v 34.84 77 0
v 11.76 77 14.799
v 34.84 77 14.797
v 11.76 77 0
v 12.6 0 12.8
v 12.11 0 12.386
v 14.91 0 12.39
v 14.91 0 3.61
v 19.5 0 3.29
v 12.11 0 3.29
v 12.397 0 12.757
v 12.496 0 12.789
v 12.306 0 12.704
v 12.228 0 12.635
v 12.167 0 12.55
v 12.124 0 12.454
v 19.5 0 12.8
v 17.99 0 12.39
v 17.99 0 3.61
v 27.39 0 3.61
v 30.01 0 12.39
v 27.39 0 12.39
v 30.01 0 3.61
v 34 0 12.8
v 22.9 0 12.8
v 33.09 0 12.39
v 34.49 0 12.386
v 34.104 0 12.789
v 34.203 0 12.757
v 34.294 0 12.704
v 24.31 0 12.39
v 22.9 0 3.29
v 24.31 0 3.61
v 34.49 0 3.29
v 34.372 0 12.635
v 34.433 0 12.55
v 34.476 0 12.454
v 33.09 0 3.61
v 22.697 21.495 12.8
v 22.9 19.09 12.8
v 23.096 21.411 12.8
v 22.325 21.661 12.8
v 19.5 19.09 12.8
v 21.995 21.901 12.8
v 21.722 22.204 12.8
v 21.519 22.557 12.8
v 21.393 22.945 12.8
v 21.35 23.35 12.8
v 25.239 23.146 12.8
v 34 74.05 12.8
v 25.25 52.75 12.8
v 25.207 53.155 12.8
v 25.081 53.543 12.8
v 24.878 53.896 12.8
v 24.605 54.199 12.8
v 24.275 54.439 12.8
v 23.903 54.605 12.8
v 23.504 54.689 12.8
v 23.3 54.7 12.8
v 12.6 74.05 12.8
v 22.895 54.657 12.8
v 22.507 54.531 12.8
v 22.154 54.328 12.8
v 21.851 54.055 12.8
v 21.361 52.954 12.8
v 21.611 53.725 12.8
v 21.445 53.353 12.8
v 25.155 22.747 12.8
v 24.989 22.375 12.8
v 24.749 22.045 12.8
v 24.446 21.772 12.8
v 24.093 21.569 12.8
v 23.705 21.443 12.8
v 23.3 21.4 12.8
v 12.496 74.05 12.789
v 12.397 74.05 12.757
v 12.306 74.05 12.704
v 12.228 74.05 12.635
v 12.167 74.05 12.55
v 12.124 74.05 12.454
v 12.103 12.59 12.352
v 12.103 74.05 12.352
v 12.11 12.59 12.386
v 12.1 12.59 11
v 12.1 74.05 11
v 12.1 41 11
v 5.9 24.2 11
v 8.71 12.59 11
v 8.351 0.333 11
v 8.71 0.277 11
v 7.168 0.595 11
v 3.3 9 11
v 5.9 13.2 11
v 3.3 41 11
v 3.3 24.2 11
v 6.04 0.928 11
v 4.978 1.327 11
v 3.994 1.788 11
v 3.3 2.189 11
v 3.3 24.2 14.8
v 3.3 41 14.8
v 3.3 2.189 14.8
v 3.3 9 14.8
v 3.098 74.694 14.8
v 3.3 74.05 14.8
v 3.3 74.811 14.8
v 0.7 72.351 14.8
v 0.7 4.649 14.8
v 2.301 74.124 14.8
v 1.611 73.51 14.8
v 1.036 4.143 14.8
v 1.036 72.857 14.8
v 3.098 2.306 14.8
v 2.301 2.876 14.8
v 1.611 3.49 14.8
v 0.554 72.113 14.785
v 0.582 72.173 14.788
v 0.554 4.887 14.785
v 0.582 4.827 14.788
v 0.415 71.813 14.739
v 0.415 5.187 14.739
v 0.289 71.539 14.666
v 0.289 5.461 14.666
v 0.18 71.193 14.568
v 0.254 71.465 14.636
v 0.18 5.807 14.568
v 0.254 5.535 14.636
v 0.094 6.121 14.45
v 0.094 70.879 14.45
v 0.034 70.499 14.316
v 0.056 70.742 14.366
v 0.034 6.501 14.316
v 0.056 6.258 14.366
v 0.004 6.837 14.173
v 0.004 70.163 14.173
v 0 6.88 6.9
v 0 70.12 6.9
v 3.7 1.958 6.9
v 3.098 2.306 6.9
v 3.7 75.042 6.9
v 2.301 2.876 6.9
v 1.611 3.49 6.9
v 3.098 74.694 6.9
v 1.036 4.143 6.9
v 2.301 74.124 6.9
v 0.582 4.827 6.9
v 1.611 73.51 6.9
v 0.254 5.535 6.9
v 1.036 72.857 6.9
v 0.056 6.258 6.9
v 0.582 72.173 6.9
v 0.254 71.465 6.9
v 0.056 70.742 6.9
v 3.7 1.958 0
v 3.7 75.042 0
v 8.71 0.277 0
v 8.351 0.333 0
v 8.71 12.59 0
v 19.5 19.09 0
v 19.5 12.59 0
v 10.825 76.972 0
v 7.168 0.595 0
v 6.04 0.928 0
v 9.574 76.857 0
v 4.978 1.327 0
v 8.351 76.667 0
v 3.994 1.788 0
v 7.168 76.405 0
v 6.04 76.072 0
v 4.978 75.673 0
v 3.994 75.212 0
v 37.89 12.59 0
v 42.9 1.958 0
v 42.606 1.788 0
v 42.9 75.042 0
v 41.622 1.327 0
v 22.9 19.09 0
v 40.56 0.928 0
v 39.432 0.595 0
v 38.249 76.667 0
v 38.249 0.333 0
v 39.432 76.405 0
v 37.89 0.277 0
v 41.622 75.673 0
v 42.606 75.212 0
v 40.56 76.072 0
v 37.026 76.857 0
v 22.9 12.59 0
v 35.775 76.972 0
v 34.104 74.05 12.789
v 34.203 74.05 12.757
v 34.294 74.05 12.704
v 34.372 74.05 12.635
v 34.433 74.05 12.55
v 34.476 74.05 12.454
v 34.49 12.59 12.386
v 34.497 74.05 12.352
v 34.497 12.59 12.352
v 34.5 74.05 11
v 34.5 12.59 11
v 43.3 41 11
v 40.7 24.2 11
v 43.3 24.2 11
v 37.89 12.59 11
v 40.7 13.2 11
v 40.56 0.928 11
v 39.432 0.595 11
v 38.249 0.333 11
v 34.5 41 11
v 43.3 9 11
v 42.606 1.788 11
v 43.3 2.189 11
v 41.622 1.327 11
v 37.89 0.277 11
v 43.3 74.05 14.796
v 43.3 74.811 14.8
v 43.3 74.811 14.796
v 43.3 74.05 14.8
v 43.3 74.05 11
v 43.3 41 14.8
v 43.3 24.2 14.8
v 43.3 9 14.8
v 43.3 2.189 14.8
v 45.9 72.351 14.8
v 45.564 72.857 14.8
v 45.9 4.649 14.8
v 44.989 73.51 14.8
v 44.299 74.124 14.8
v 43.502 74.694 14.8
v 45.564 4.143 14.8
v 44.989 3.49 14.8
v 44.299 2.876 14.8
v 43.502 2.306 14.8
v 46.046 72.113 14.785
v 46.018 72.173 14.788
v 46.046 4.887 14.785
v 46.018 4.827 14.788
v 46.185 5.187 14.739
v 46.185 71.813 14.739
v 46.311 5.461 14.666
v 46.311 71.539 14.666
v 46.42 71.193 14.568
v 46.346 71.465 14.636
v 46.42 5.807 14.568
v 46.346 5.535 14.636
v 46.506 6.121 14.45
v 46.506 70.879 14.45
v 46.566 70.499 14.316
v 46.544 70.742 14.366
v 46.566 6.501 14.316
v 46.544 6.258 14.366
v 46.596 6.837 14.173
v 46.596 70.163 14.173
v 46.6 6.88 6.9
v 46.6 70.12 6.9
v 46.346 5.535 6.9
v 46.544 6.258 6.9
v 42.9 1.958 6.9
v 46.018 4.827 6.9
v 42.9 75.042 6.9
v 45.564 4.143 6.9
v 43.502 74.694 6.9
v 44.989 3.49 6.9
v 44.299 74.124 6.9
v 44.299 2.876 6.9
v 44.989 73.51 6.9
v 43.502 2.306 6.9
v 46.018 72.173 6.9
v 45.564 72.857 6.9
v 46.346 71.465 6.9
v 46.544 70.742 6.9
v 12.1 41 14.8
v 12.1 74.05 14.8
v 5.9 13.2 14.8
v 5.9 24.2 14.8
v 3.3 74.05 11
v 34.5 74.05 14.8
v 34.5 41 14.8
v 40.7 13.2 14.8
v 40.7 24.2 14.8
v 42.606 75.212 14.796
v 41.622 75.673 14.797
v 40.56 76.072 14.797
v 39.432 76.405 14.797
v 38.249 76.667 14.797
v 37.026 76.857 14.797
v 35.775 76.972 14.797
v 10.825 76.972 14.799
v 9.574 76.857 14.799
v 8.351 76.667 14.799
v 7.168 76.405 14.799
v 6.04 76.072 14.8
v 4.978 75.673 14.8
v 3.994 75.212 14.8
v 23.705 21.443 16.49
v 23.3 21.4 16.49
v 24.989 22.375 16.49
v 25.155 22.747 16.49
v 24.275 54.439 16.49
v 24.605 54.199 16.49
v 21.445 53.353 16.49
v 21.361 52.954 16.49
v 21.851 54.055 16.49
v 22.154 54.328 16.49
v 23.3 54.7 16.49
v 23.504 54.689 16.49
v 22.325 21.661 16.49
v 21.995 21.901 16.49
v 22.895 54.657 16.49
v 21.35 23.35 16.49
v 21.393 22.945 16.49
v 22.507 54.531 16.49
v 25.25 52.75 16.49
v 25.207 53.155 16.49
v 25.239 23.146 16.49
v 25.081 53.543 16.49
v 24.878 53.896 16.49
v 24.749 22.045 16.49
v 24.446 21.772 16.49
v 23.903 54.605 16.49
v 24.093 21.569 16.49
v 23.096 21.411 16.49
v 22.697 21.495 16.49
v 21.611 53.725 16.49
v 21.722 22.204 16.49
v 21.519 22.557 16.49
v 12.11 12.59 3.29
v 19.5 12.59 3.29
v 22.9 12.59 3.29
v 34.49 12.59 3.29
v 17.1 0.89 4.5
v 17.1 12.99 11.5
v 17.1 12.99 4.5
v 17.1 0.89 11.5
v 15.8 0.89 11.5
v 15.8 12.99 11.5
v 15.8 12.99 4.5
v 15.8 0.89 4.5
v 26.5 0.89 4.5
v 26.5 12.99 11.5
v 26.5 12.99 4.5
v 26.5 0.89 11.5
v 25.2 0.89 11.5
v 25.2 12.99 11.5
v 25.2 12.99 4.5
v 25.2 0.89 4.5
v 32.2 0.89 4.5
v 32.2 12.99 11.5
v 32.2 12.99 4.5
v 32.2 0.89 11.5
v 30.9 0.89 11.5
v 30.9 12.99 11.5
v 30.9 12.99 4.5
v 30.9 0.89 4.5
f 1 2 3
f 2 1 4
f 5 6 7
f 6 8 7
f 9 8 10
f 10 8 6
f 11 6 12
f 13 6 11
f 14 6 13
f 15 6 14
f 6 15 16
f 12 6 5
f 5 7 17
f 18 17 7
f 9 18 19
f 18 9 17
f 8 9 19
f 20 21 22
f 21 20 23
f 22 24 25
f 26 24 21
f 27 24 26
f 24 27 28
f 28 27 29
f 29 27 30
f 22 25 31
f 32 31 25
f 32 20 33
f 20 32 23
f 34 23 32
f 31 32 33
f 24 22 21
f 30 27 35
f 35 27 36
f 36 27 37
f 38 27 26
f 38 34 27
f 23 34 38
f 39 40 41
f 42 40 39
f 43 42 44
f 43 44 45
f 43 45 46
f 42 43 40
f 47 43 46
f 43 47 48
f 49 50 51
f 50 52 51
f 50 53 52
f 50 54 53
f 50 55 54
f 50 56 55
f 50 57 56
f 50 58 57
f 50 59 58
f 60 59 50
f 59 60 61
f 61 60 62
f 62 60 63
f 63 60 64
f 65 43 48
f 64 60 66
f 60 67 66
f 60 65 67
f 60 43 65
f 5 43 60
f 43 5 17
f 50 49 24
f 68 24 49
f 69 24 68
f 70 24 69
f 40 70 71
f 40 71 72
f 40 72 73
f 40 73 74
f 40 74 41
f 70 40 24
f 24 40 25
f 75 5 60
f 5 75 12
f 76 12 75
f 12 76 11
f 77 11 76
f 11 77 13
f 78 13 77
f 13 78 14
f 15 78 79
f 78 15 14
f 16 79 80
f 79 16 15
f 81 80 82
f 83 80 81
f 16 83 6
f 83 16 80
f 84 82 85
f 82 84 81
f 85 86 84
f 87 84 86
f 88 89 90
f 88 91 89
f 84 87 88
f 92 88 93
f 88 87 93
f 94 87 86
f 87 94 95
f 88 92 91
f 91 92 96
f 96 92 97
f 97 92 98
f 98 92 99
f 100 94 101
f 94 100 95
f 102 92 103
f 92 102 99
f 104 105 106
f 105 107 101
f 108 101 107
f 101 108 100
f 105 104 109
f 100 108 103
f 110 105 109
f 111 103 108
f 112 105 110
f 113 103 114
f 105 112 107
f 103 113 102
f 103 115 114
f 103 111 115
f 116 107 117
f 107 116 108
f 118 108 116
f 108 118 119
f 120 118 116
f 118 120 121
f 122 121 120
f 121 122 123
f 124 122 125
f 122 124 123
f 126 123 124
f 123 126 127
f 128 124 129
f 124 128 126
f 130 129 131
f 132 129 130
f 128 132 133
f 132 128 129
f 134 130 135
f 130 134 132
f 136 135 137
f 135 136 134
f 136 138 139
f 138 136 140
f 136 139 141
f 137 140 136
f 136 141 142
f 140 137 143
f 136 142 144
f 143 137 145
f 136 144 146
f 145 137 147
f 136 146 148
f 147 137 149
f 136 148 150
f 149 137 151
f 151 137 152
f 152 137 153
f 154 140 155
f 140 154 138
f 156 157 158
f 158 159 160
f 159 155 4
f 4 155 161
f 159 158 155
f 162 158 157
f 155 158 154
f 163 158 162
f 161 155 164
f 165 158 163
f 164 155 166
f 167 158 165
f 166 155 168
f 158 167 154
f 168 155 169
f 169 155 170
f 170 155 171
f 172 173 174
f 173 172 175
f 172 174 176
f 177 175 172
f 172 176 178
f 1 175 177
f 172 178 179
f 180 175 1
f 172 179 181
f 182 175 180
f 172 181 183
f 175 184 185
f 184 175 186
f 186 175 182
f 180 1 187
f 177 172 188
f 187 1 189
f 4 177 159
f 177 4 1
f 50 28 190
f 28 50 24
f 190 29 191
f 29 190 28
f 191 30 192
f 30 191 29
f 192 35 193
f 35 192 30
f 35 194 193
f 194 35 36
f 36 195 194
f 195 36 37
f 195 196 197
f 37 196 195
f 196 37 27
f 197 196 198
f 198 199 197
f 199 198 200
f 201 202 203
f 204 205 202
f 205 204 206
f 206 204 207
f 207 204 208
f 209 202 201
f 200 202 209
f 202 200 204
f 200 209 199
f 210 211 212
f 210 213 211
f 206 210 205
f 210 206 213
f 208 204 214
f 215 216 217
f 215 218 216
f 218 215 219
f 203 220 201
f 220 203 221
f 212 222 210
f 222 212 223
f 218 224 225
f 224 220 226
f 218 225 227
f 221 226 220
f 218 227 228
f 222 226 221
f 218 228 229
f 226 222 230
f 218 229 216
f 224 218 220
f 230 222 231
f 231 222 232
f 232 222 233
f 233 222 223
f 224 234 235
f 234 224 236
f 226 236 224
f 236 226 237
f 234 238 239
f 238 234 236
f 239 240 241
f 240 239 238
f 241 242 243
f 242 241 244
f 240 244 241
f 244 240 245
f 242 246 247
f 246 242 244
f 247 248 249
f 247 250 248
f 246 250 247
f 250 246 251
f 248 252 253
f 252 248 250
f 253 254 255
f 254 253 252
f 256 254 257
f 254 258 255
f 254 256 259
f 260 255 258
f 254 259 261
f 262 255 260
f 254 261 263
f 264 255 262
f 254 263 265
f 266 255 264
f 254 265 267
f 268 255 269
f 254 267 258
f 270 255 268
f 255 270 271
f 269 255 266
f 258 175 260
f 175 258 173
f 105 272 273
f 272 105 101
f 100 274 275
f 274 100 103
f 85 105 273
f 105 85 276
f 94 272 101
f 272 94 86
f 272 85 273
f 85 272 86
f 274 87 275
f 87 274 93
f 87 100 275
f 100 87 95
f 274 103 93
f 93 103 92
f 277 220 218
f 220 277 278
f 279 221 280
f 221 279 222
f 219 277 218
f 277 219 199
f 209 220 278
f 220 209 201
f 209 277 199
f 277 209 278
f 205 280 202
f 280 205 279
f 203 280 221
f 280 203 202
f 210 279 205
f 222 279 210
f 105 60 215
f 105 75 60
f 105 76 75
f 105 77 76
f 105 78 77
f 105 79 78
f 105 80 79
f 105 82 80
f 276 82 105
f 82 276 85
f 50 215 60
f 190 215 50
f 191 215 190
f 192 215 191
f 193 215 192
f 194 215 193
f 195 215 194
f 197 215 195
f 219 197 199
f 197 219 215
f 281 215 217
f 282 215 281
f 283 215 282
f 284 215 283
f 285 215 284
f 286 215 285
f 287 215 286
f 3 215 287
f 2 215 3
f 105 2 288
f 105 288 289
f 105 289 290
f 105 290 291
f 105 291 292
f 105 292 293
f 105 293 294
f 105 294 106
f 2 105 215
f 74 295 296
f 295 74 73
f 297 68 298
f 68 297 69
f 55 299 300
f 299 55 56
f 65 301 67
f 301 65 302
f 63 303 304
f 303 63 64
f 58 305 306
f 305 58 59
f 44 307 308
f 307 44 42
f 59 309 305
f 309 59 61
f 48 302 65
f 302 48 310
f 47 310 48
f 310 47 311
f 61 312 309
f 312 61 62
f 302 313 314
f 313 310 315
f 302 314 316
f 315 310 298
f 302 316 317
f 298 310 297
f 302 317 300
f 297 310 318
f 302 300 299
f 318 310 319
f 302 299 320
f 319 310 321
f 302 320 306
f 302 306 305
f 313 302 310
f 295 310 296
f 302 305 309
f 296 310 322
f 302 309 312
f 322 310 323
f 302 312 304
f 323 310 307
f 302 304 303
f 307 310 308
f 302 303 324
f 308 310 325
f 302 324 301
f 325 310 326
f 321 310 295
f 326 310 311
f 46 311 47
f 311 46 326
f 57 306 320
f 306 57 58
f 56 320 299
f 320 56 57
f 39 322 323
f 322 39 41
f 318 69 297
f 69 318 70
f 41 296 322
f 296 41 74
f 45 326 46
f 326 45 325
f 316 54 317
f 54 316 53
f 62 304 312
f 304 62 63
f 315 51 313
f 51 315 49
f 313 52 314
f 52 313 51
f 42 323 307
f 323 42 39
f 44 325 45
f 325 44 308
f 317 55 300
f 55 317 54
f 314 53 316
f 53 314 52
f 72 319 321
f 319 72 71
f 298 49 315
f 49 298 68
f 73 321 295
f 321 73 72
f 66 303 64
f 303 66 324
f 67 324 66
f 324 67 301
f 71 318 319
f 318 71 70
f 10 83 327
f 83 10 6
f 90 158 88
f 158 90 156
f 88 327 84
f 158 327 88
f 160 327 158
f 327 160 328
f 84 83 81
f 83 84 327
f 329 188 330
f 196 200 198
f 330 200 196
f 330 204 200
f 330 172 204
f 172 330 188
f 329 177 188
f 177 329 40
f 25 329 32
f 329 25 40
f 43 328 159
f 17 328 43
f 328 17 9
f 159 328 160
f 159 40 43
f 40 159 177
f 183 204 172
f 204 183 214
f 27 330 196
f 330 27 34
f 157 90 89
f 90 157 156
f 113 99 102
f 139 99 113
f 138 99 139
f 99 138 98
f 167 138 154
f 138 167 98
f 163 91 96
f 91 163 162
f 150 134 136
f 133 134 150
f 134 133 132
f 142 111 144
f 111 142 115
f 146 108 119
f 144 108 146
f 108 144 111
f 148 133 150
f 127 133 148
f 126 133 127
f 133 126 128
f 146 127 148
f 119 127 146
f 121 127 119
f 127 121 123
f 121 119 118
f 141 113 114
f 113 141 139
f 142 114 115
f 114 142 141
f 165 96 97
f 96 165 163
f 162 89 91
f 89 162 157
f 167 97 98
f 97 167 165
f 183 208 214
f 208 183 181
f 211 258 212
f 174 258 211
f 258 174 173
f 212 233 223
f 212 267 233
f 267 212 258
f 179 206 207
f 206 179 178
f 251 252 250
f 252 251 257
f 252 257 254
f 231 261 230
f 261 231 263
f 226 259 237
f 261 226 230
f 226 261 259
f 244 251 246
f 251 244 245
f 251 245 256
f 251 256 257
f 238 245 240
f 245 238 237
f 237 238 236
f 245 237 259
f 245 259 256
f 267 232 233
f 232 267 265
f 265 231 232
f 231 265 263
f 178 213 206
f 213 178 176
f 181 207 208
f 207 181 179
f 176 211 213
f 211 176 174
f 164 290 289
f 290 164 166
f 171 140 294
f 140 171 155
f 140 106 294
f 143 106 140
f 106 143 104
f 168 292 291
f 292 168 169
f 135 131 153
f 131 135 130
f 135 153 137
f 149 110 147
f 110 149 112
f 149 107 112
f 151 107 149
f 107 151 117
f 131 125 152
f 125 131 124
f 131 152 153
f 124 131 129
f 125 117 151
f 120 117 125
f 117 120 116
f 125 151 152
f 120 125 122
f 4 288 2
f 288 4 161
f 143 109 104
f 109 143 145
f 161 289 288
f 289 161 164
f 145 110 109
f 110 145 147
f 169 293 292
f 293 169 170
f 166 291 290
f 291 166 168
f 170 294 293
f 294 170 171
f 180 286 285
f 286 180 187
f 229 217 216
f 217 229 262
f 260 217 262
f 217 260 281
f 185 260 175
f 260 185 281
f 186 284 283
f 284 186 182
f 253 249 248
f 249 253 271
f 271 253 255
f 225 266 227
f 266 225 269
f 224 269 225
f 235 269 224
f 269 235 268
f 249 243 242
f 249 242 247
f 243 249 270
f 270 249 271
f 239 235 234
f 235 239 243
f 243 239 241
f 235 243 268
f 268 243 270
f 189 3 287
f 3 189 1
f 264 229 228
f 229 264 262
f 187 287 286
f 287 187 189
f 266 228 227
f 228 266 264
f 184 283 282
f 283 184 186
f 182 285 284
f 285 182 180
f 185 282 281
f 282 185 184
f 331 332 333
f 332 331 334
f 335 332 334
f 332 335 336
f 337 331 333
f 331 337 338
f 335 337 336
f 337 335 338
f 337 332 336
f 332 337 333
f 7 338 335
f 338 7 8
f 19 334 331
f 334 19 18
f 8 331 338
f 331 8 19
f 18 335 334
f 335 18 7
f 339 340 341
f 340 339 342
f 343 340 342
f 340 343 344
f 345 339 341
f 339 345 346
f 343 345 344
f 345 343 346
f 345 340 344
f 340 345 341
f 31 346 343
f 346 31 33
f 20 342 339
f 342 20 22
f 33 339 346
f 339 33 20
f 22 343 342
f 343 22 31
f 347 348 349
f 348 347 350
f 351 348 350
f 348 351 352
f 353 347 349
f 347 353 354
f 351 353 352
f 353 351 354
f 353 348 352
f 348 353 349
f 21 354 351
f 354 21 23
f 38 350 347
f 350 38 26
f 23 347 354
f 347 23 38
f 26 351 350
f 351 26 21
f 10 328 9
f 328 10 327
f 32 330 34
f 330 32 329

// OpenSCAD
/** @todo Add a customizer parameter to generate the battery socket without the block for the terminals. Allows to 
  *   create blind sockets, such as to secure battery packs for transportation, or to mount them in storage.
  * @todo Add a customizer parameter to choose between creating a solid plastic piece (for a blind plate or similar) 
  *   and one with hollows for terminal clips and wires.
  */

// Up here to appear before any assert() and echo() in the parameters section.
// Narrow enough to fit into one line of output when the console is at minimum width.
echo("\n\n============ NEXT RUN ============");


// (1) INCLUDES
// ======================================================================

// Round Anything library from https://github.com/Irev-Dev/Round-Anything/
include<Round-Anything/polyround.scad>


// (2) CUSTOMIZER PARAMETERS
// ======================================================================

// Degree of details in the output. Influences segments per degree, filleting quality etc..
quality = "preview"; // ["fast preview", "preview", "rendering", "final rendering"]


// (3) FIXED AND DERIVED MEASURES
// ======================================================================

// Prevent anything following from showing up as Customizer parameters.
/* [Hidden] */

// Degrees per fragment of a circle.
$fa = (quality == "final rendering") ? 1 :
      (quality == "rendering") ? 3 : 
      (quality == "preview") ? 6 :
      (quality == "fast preview") ? 12 : 12; // The OpenSCAD default.
      
// Minimum size of circle fragments.
$fs= (quality == "final rendering") ? 0.1 :
     (quality == "rendering") ? 0.25 : 
     (quality == "preview") ? 0.5 :
     (quality == "fast preview") ? 2 : 2; // The OpenSCAD default.

// Small amount of overlap for unions and differences, to prevent z-fighting.
nothing = 0.01;

/** @brief Provide any measure (that we know of) about this design. This acts as a 
  *   central registry for measures to not clutter the global namespace. "m" for "measure".
  *   Most numbers can be adjusted, allowing customization beyond the rather simple parameters in 
  *   the OpenSCAD Customizer. All measures have been taken by measuring an original Milwaukee 
  *   battery connector on a powertool. Different from the original, we only model a connector 
  *   for inserting a battery from one side.
  * @param id  String identifier of the dimension to retrieve. Look into the source to see 
  *   which are available.
  * @todo Add the positions and dimensions of the battery terminal connectors.
  */
function m(id) = (
    // Measures on the battery.
    id == "battery play d" ? 2.7 : // When the battery is in the socket.
    id == "battery snapper wide part total d" ? 6.5 :
    id == "battery snapper d" ? 14.1 :

    // Main measures on the battery socket.
    id == "w" ? 46.6 :
    id == "d" ? 77 :
    id == "side h" ? 14.8 :
    id == "corner radius w" ? m("middle section offset w"): // @todo rename to "h edges radius w"
    id == "corner radius d" ? 7.0 : // @todo rename to "h edges radius d"
    id == "outer edges r" ? 0.7 :   // @todo rename to "d edges radius"
    id == "backwall d min" ? 2.0 :
    id == "backwall d max" ? 3.9 :
    id == "backwall d" ? (m("backwall d min") + m("backwall d max")) / 2 :
    
    // Middle section, which is a separate part of the original Milwaukee battery socket.
    id == "middle section h" ? 12.8 :
    id == "middle section w" ? m("w") - 2 * m("lock grooves offset w") - 2 * m("lock grooves w") :
    id == "middle section offset w" ? (m("w") - m("middle section w")) / 2 :
    id == "middle section undercut h" ? 3.3 :
    id == "middle section undercut d" ? 12.6 :
    id == "middle section edge r" ? 0.5 :
    
    // Raised block on top of the middle section part, forming the highest point of the battery socket.
    id == "ridge w" ? 3.9 :
    id == "ridge d" ? 33.3 :
    id == "ridge h" ? 3.7 :
    id == "ridge offset w" ? m("w") / 2 - m("ridge w") / 2 :
    id == "ridge offset d" ? 21.4 :
    id == "ridge arcs d" ? 1.6 : // Unused. We simplify to a semi-circle arc via a radius the height edges, see below.
    id == "ridge h edges r" ? m("ridge w") / 2 : // Maximum possible corner radius, yielding a semi-circle at the ends.
    
    // Grooves on the left and right to mount the battery pack mechanically. Closer to the device than all other grooves.
    id == "mount grooves w" ? 3.7 :
    id == "mount grooves h" ? 6.9 :
    id == "mount grooves wall t" ? m("terminal grooves 1+3 offset w") - m("mount grooves w") :
    
    // The two grooves with the locking mechanism.
    id == "lock grooves w" ? 8.8 : // Full width, including lock block w.
    id == "lock grooves h" ? 3.8 :
    id == "lock grooves min d" ? 
        m("lock block offset d") + m("lock block d") + m("battery play d") + m("battery snapper d") :
    id == "lock grooves offset w" ? 3.3 :
    id == "lock grooves offset h" ? m("side h") - m("lock grooves h") :
    
    // Snap mechanism inside the snapper grooves.
    id == "lock block w" ? 2.6 :
    id == "lock block d" ? 15.2 :
    id == "lock block ramp d" ? 4.2 : // As part of "lock block d".
    id == "lock block offset d" ? 9.0 :
    
    // The three grooves before, in between and after the terminal block. 1-3 from left to right.
    id == "terminal grooves w" ? 3.4 :
    id == "terminal grooves 1+3 offset w" ? 8.7 : // Measured from the side face closest to each groove.
    id == "terminal grooves 1+3 d" ? m("middle section undercut d") :
    id == "terminal grooves 2 offset w" ? 19.5 :
    id == "terminal grooves 2 d" ? 19.1 :
    
    // The holes for the electrical terminal connectors, and these connectors.
    // "Outer" measures refer to the chamfer outline, not to the actual hole.
    id == "terminal holes w" ? 1.3 :
    id == "terminal holes h" ? 7.0 :
    id == "terminal holes min d" ? 13.0 : // To accommodate the terminals, which protrude 13 mm out of the casing.
    id == "terminal holes chamfer t" ? 0.9 :
    id == "terminal holes chamfer d" ? 2.0 :
    id == "terminal holes outer w" ? m("terminal holes w") + 2 * m("terminal holes chamfer t") :
    id == "terminal holes outer h" ? m("terminal holes h") + 2 * m("terminal holes chamfer t") :
    id == "terminal holes 1 outer offset w" ? 14.4 + 0.5 : // Measured in leftmost position, +0.5 mm moves it to the center.
    id == "terminal holes 2 outer offset w" ? 23.8 + 0.5 :
    id == "terminal holes 3 outer offset w" ? 29.5 + 0.5 :
    id == "terminal holes outer offset h" ? 3.6 :

    undef
);
assert(
    equals(
        m("terminal grooves 1+3 offset w") + m("terminal grooves w"),
        m("lock grooves w") + m("lock grooves offset w")
    ), 
    "Groove widths and wall thicknesses do not match between upper and lower section."
);


// (4) REUSABLES
// ======================================================================

/** @brief Replacement for the "==" operator that ignores the imprecision of calculation with numbers in OpenSCAD, because all 
  *   numbers including literals like "10.1" are internally double precision reals. Useful in assert(), because otherwise 
  *   even something simple like assert(8.8 + 2.3 == 11.1) will not be asserted.
  * @return true if the difference between the input numbers is less than 1×10¯¹⁰
  */
function equals(n1, n2) = (
    // echo("DEBUG: equals(): ", n1, " – ", n2, " = ", abs(n1 - n2)) // Enable for debugging
    abs(n1 - n2) < 1e-10
);


/** @brief Convert a relative path into an absolute path.
  * @detail A relative path is a vector starting with a corner [x, y, corner_radius] as the first element and having a series 
  *   of movements as the following elements. Each movement is an element [dx, dy, radius] of two deltas relative to the 
  *   previous path element and a corner radius at the target point of the movement. Paths can be interpreted as open paths or 
  *   (by assuming a last implicit movement back to the starting point) as closed paths / polygons. When interpreted as open 
  *   paths, the corner radius of the starting point has no meaning.
  *   When converting a relative path into an absolute path, the relative movements are resolved into absolute coordinates, but 
  *   the corner_radius spec is unchanged. So it is not a simple set of points afterwards, but still a path, as there can be 
  *   the corner_radius elements that specify curved sections.
  * @param path  A path. This is a vector starting with a point as first elements and having series of movements as the 
  *   following elements. Each movement is an element [dx, dy, radius] of two deltas relative to the previous path element 
  *   and a corner radius at the target point of the movement. Paths can be interpreted as open paths or (by assuming a 
  *   last implicit movement back to the starting point) as closed paths / polygons. When interpreted as open paths, the 
  *   corner radius of the starting point has no meaning.
  * @param last_index  An index into the path, pointing to the last element to process. Usually left out, in which case it 
  *   defaults to the highest possible index.
  * @todo Contribute this function to the Round Anything library.
  */
function abs_path(path, last_index) = (
    // Recursion end case.
    let(i = last_index == undef ? len(path) - 1 : last_index)
    i == 0 ? [path[0]] :
        
    // Recursion case.
    let(
        prev_points = abs_path(path, i - 1),
        prev_point = prev_points[i - 1]
    )
    concat(
        prev_points,
        [[ // A list of points with a single point inside.
            prev_point.x + path[i].x, 
            prev_point.y + path[i].y, 
            path[i][2]
        ]]
    )
);
assert(abs_path([[1,1,1], [2,2,2], [3,3,3]], 0) == [[1, 1, 1]], "abs_path() failed test 1");
assert(abs_path([[1,1,1], [2,2,2], [3,3,3]], 1) == [[1, 1, 1], [3, 3, 2]], "abs_path() failed test 2");
assert(abs_path([[1,1,1], [2,2,2], [3,3,3]], 2) == [[1, 1, 1], [3, 3, 2], [6, 6, 3]], "abs_path() failed test 3");
assert(abs_path([[1,1,1], [2,2,2], [3,3,3]]   ) == [[1, 1, 1], [3, 3, 2], [6, 6, 3]], "abs_path() failed test 4");


/** Shorthand function to create the points of a rounded polygon from a path. This enables to call 
  * "polygon(polygon_points(left_lockblock_path))". */
function polygon_points(path, fn) = (
    // Due to a bug, polyRound(…, fn = undef) will not render anything, so we have to exclude that case.
    fn == undef ? polyRound(abs_path(path)) :
    polyRound(abs_path(path), fn)
);


/** Shorthand module to create a rounded polygon from a path. */
module rounded_polygon(path, fn) {
    polygon(polygon_points(path, fn));
}


/** Creates a fillet in the first octant, with the 90° angle along the axis. */
module asymmetrical_fillet(w, d, h) {
    difference() {
        cube([w, d, h]);
        
        translate([w, d, 0])
            scale([1, d / w, 1])
                cylinder(h = h, r = w);
    }
}


// (5) PARTS
// ======================================================================

/** Base shape of the battery socket, in its final position. */
module battery_socket_base() {
    // Left half outline path, as a starting point and relative movements [delta_x, delta_y, corner_radius].
    // The left path is by "nothing" wider than half the complete shape. This leads to overlap when combining the two halves, 
    // which is necessary here to prevent an additional volume in the final rendering.
    left_path = [ // Start point is the right top corner. Path follows CCW.
        [m("w") / 2 + nothing, m("middle section h"), 0],
        [-m("middle section w") / 2 - nothing, 0, m("middle section edge r")],
        [0, -m("middle section h") + m("lock grooves offset h"), 0],
        [- m("lock grooves w"), 0, 0 ],
        [0, m("lock grooves h"), 0],
        [- m("lock grooves offset w"), 0, m("outer edges r")],
        [0, -(m("side h") - m("mount grooves h")), 0],
        [m("mount grooves w"), 0, 0],
        [0, -m("mount grooves h"), 0],
        [(m("w") - 2 * m("mount grooves w")) / 2 + nothing, 0, 0]
    ];
    
    translate([0, m("d"), 0])
        rotate([90, 0, 0]) {
            // Left half.
            linear_extrude(height = m("d"), convexity = 5)
                // fn is the number of radius fragments. Divided by 4 as a corner is 1/4 circle. By 2 as these are small radii.
                rounded_polygon(left_path, fn = 360 / $fa / 4 / 2);
            
            // Right half, as a mirrored left half.
            translate([m("w"), 0, 0])
                mirror([1, 0, 0])
                    linear_extrude(height = m("d"), convexity = 5) 
                        rounded_polygon(left_path, fn = 360 / $fa / 4 / 2);
        }
}


/** Back wall of the battery socket, in its final position. */
module backwall() {
    // Backwall outline path, as a starting point and relative movements [delta_x, delta_y, corner_radius].
    path = [
        [m("mount grooves w"), 0, 0],
        [m("w") - 2 * m("mount grooves w"), 0, 0],
        [0, m("mount grooves h"), 0],
        [m("mount grooves w"), 0, 0],
        [0, m("side h") - m("mount grooves h"), m("outer edges r")],
        [-m("w"), 0, m("outer edges r")],
        [0, -(m("side h") - m("mount grooves h")), 0],
        [m("mount grooves w"), 0, 0]
    ];
    
    translate([0, m("d"), 0])
        rotate([90, 0, 0])
            linear_extrude(height = m("backwall d")) 
                // fn is the number of fragments for a radius. Divided by 4 as a corner is 1/4 circle. By 2 as these are small radii.
                rounded_polygon(path, fn = 360 / $fa / 4 / 2);
}


/** Ridge block at the top of the battery socket, in its final position. */
module ridge() {
    // Ridge outline path from the top, as a starting point and relative movements [delta_x, delta_y, corner_radius].
    path = [
        [0, 0, m("ridge h edges r")],
        [m("ridge w"), 0, m("ridge h edges r")],
        [0, m("ridge d"), m("ridge h edges r")],
        [-m("ridge w"), 0, m("ridge h edges r")]
    ];
    
    translate([m("ridge offset w"), m("ridge offset d"), m("middle section h") - nothing])
        linear_extrude(height = m("ridge h"))
            // fn is the number of fragments for a radius. Divided by 4 as a corner is 1/4 circle. By 2 as these are small radii.
            rounded_polygon(path, fn = 360 / $fa / 4 / 2);
}


/** All blocks inside the lock grooves of the battery socket, in their final position. */
module lock_grooves_blocks() {
    module left_blocks() {
        // Paths from the top, given by a starting point and relative movements [delta_x, delta_y, corner_radius].
        left_fillerblock_path = [
            [0, 0, 0],
            [m("lock grooves w"), 0, 0],
            [0, m("d") - m("lock grooves min d") - m("backwall d"), 0],
            [-m("lock grooves w"), 0, 0]
        ];
        left_lockblock_path = [
            [0, 0, 0],
            [m("lock block w"), m("lock block ramp d"), 0],
            [0, m("lock block d") - m("lock block ramp d"), 0],
            [-m("lock block w"), 0, 0]
        ];
        
        linear_extrude(height = m("lock grooves h")) {
            translate([m("lock grooves offset w"), m("lock grooves min d")])
                rounded_polygon(left_fillerblock_path);
            translate([m("lock grooves offset w"), m("lock block offset d")])
                rounded_polygon(left_lockblock_path);
        }
    }
    
    translate([0, 0, m("lock grooves offset h")]) {
        left_blocks();
        translate([m("w"), 0, 0])  mirror([1, 0, 0])  left_blocks();
    }
}


/** Cutters for the terminal grooves of the battery socket, in their final position. */
module terminal_grooves() {
    translate([m("terminal grooves 1+3 offset w") + nothing, -nothing, -nothing])
        cube([m("terminal grooves w"), m("terminal grooves 1+3 d"), m("side h")]);
    
    translate([m("terminal grooves 2 offset w"), -nothing, -nothing])
        cube([m("terminal grooves w"), m("terminal grooves 2 d"), m("side h")]);
    
    translate([m("w") - m("terminal grooves 1+3 offset w") - m("terminal grooves w") - nothing, -nothing, -nothing])
        cube([m("terminal grooves w"), m("terminal grooves 1+3 d"), m("side h")]);
}


/** Cutter for the undercut under the terminals, in its final position. */
module middle_section_undercut() {
    translate([m("middle section offset w"), -nothing, -nothing])
        cube([m("middle section w"), m("middle section undercut d"), m("middle section undercut h")]);
}


/** A hole to cut into the terminal for a connector. Positioned as if cut into the xz plane with [0,0] offset. */
module terminal_hole() {
    // Actual terminal hole.
    translate([m("terminal holes chamfer t"), 0, m("terminal holes chamfer t")])
        cube([m("terminal holes w"), m("terminal holes min d"), m("terminal holes h")]);
    
    // Chamfer around the hole.
    chamfer_scale = [m("terminal holes w") / m("terminal holes outer w"), m("terminal holes h") / m("terminal holes outer h")];
    translate([m("terminal holes outer w") / 2, 0, m("terminal holes outer h") / 2]) rotate([-90, 0, 0]) {
        linear_extrude(height = m("terminal holes chamfer t"), scale = chamfer_scale)
            square([m("terminal holes outer w"), m("terminal holes outer h")], center = true);
    }
}


module battery_socket() {
    module corner_cutter() {
        render() 
            asymmetrical_fillet(w = m("corner radius w"), d = m("corner radius d"), h = m("side h") + 2 * nothing);
    }
    
    difference() {
        union() {
            color("Chocolate") battery_socket_base();
            color("Chocolate") backwall();
            color("SteelBlue") ridge();
            color("SteelBlue") lock_grooves_blocks();
        }
        
        terminal_grooves();
        middle_section_undercut();
        
        translate([-nothing, -nothing, -nothing])                                                     corner_cutter();
        translate([m("w") + nothing, -nothing, -nothing])         mirror([1, 0, 0])                   corner_cutter();
        translate([-nothing, m("d") + nothing, -nothing])         mirror([0, 1, 0])                   corner_cutter();
        translate([m("w") + nothing, m("d") + nothing, -nothing]) mirror([1, 0, 0]) mirror([0, 1, 0]) corner_cutter();
        
        translate([m("terminal holes 1 outer offset w"), -nothing, m("terminal holes outer offset h")]) terminal_hole();
        translate([m("terminal holes 2 outer offset w"), -nothing, m("terminal holes outer offset h")]) terminal_hole();
        translate([m("terminal holes 3 outer offset w"), -nothing, m("terminal holes outer offset h")]) terminal_hole();
    }
}


// (6) SCENE
// ======================================================================

// Entry point of geometry generation.
//
// A final union() guarantees printable, non-intersecting geometries even when the lazy unions 
// feature is no longer experimental and also applied to user modules (not the case as of version 
// 2020.09.18). See: http://forum.openscad.org/-tp27991.html .
if (quality == "final rendering")
    union()
        battery_socket();
else
    battery_socket();
